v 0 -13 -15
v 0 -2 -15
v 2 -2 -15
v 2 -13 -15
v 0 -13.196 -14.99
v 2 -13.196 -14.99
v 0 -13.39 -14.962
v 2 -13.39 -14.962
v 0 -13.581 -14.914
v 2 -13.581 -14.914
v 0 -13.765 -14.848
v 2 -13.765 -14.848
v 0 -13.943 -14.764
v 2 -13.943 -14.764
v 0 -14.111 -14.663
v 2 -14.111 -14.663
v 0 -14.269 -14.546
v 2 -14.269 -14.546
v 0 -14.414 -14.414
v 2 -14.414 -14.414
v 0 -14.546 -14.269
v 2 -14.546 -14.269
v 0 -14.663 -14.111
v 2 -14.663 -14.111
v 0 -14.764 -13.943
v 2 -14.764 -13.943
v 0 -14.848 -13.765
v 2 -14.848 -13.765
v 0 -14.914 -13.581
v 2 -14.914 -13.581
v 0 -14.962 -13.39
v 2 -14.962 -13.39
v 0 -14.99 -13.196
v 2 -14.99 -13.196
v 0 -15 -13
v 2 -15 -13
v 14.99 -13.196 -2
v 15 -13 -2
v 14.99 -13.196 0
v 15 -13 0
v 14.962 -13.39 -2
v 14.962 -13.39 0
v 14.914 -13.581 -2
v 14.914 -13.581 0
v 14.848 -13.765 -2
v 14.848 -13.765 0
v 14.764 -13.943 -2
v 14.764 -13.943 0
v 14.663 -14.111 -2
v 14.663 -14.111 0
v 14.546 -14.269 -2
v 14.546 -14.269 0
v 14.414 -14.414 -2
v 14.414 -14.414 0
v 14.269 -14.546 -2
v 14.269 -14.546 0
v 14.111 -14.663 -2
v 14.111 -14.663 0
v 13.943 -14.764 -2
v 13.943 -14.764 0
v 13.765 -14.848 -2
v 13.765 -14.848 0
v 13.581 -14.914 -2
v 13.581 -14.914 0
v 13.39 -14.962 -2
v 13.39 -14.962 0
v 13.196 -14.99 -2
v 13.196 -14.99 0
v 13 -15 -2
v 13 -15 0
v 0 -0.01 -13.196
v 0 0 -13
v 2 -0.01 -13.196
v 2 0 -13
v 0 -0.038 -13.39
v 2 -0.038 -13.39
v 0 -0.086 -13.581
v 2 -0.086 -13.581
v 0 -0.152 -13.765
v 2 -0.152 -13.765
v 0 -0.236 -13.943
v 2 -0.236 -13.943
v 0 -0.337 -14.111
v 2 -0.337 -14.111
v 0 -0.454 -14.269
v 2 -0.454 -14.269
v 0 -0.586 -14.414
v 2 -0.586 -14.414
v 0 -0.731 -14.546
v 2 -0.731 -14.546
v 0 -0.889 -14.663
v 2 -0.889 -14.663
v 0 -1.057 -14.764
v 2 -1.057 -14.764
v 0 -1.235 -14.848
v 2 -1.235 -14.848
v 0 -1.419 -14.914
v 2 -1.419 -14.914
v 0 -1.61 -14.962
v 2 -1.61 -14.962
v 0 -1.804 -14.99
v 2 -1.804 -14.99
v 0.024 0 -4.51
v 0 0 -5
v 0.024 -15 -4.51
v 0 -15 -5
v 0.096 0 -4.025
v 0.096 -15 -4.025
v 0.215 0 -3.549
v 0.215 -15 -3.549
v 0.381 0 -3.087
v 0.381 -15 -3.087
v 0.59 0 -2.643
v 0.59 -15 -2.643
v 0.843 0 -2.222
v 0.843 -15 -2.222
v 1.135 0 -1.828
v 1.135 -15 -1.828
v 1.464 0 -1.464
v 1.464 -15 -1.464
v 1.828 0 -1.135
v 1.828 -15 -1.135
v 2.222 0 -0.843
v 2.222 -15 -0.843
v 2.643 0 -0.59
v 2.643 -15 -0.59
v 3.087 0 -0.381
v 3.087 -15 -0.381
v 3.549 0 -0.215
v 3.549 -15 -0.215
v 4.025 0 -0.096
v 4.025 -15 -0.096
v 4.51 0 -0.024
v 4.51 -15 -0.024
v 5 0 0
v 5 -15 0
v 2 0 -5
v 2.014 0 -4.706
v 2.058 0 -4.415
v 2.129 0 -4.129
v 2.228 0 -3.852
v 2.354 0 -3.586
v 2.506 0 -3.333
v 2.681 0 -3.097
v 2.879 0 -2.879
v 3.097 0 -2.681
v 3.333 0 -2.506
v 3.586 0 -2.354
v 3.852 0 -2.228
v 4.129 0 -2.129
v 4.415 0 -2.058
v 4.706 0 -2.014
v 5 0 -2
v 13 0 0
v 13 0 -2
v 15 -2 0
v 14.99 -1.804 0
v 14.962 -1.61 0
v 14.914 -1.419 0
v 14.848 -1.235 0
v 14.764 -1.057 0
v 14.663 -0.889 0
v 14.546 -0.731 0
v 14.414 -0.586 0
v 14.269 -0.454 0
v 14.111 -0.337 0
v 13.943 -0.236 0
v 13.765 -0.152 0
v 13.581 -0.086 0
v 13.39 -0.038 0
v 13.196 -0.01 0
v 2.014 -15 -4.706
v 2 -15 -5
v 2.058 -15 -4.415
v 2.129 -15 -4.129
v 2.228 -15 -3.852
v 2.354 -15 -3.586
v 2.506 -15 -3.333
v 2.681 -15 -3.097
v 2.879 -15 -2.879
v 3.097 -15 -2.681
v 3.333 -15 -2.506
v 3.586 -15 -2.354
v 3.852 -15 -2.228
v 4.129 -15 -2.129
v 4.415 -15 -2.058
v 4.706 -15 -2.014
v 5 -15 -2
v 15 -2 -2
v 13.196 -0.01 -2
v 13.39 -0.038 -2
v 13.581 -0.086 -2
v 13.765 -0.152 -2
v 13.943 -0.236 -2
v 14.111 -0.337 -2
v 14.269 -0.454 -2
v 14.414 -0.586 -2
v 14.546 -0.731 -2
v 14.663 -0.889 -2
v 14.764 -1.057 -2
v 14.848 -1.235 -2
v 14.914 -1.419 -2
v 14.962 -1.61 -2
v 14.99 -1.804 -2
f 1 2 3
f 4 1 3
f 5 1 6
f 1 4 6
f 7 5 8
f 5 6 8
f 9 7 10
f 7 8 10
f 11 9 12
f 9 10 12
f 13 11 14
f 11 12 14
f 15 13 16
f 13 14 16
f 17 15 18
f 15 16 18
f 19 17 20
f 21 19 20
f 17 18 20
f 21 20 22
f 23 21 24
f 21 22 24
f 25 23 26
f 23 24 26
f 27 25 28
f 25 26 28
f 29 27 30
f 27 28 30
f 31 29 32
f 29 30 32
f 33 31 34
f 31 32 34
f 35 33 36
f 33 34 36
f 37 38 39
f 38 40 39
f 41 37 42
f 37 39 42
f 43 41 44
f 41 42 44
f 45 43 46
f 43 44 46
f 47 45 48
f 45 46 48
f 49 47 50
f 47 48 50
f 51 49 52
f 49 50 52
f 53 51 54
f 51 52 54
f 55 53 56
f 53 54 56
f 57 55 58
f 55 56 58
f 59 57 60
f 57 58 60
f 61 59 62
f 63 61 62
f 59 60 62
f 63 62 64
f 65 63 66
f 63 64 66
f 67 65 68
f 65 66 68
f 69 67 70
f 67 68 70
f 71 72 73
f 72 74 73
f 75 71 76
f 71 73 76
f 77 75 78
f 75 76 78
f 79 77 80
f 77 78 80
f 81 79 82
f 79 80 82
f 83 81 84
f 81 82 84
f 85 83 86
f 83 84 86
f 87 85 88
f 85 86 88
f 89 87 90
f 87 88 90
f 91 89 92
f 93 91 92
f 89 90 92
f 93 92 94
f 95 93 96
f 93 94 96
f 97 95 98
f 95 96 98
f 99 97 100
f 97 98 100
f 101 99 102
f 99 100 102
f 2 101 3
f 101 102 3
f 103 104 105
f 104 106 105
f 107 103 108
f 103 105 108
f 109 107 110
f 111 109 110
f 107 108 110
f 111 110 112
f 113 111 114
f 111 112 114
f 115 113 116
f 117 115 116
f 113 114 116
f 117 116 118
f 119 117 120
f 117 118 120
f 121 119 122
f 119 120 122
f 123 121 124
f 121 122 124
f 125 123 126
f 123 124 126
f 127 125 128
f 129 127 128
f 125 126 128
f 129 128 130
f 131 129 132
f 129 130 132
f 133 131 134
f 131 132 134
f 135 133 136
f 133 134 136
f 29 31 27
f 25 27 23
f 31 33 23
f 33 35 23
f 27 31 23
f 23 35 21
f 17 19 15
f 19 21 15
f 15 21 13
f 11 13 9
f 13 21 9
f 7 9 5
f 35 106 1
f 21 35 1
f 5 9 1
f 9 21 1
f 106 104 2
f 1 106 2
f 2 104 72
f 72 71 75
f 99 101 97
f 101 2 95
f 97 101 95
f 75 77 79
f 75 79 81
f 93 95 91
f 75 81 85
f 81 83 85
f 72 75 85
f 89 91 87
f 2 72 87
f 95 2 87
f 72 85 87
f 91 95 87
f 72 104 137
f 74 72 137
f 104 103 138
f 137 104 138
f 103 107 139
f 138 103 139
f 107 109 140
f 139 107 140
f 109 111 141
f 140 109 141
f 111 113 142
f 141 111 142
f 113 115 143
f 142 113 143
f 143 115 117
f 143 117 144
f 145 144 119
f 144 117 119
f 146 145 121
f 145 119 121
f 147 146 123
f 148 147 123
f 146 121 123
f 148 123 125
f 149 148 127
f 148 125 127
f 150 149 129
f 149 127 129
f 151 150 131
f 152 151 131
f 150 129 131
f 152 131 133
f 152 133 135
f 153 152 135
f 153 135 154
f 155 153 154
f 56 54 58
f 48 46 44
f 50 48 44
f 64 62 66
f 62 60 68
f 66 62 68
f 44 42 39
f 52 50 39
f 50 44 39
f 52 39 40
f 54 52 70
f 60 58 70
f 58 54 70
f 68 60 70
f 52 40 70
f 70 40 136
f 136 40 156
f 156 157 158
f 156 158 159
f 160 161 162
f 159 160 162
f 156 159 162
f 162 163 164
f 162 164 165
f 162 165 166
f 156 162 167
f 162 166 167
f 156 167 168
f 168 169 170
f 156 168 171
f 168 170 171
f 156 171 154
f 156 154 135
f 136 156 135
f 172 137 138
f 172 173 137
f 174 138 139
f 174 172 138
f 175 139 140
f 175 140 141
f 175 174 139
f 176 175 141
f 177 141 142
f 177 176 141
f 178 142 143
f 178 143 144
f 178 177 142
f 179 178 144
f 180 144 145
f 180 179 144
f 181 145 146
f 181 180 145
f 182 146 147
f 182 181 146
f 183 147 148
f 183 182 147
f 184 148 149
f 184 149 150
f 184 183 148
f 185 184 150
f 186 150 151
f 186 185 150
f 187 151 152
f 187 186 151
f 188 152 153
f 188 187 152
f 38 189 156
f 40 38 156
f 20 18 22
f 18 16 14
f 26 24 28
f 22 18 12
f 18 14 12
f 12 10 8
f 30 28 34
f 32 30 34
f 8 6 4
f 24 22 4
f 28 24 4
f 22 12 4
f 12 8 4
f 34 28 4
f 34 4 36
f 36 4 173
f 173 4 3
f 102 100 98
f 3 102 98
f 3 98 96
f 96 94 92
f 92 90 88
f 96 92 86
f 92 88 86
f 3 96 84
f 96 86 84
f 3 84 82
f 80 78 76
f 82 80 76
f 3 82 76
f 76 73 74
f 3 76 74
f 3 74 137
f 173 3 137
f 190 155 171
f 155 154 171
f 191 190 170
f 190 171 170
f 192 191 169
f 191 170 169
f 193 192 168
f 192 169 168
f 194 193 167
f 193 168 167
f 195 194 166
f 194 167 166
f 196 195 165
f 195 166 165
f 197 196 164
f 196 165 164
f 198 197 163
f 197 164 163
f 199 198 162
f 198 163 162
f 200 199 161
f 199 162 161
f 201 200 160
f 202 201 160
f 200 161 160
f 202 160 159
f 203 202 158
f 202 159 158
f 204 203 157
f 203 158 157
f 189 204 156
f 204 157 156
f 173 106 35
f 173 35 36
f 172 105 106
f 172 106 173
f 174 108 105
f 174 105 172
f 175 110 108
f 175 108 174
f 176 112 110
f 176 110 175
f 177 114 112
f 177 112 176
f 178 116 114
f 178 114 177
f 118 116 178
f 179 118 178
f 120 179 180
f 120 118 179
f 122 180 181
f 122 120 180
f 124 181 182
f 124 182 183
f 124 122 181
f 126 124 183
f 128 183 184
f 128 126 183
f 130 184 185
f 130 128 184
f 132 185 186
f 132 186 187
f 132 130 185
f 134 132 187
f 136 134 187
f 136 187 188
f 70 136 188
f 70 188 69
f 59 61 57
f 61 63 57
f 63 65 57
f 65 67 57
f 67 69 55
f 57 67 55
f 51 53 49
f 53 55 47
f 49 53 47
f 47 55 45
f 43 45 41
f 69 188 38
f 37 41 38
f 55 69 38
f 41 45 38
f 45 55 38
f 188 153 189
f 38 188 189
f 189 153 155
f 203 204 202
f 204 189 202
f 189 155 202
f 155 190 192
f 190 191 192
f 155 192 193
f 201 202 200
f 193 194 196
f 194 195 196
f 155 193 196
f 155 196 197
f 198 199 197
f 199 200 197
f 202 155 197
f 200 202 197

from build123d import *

# Parameters (mm, degrees)
F1_DEPTH = 15
F2_R     = 3
F3_R     = 5
F4_R     = 2


with BuildPart() as f1:
    # F0 (on Front) → F1 (new body)
    with BuildSketch(Plane.XZ):
        Polygon((15, 0), (0, 0), (0, -15), (2, -15), (2, -2), (15, -2), align=None)
    extrude(amount=F1_DEPTH)

    # F2
    f2_edges = [f1.edges().sort_by_distance(p)[0] for p in [
        (2, -7.5, -2),
    ]]
    fillet(f2_edges, radius=F2_R)

    # F3
    f3_edges = [f1.edges().sort_by_distance(p)[0] for p in [
        (0, -7.5, 0),
    ]]
    fillet(f3_edges, radius=F3_R)

    # F4
    f4_edges = [f1.edges().sort_by_distance(p)[0] for p in [
        (15, -15, -1),
        (15, 0, -1),
        (1, -15, -15),
        (1, 0, -15),
    ]]
    fillet(f4_edges, radius=F4_R)


solid = f1.part
